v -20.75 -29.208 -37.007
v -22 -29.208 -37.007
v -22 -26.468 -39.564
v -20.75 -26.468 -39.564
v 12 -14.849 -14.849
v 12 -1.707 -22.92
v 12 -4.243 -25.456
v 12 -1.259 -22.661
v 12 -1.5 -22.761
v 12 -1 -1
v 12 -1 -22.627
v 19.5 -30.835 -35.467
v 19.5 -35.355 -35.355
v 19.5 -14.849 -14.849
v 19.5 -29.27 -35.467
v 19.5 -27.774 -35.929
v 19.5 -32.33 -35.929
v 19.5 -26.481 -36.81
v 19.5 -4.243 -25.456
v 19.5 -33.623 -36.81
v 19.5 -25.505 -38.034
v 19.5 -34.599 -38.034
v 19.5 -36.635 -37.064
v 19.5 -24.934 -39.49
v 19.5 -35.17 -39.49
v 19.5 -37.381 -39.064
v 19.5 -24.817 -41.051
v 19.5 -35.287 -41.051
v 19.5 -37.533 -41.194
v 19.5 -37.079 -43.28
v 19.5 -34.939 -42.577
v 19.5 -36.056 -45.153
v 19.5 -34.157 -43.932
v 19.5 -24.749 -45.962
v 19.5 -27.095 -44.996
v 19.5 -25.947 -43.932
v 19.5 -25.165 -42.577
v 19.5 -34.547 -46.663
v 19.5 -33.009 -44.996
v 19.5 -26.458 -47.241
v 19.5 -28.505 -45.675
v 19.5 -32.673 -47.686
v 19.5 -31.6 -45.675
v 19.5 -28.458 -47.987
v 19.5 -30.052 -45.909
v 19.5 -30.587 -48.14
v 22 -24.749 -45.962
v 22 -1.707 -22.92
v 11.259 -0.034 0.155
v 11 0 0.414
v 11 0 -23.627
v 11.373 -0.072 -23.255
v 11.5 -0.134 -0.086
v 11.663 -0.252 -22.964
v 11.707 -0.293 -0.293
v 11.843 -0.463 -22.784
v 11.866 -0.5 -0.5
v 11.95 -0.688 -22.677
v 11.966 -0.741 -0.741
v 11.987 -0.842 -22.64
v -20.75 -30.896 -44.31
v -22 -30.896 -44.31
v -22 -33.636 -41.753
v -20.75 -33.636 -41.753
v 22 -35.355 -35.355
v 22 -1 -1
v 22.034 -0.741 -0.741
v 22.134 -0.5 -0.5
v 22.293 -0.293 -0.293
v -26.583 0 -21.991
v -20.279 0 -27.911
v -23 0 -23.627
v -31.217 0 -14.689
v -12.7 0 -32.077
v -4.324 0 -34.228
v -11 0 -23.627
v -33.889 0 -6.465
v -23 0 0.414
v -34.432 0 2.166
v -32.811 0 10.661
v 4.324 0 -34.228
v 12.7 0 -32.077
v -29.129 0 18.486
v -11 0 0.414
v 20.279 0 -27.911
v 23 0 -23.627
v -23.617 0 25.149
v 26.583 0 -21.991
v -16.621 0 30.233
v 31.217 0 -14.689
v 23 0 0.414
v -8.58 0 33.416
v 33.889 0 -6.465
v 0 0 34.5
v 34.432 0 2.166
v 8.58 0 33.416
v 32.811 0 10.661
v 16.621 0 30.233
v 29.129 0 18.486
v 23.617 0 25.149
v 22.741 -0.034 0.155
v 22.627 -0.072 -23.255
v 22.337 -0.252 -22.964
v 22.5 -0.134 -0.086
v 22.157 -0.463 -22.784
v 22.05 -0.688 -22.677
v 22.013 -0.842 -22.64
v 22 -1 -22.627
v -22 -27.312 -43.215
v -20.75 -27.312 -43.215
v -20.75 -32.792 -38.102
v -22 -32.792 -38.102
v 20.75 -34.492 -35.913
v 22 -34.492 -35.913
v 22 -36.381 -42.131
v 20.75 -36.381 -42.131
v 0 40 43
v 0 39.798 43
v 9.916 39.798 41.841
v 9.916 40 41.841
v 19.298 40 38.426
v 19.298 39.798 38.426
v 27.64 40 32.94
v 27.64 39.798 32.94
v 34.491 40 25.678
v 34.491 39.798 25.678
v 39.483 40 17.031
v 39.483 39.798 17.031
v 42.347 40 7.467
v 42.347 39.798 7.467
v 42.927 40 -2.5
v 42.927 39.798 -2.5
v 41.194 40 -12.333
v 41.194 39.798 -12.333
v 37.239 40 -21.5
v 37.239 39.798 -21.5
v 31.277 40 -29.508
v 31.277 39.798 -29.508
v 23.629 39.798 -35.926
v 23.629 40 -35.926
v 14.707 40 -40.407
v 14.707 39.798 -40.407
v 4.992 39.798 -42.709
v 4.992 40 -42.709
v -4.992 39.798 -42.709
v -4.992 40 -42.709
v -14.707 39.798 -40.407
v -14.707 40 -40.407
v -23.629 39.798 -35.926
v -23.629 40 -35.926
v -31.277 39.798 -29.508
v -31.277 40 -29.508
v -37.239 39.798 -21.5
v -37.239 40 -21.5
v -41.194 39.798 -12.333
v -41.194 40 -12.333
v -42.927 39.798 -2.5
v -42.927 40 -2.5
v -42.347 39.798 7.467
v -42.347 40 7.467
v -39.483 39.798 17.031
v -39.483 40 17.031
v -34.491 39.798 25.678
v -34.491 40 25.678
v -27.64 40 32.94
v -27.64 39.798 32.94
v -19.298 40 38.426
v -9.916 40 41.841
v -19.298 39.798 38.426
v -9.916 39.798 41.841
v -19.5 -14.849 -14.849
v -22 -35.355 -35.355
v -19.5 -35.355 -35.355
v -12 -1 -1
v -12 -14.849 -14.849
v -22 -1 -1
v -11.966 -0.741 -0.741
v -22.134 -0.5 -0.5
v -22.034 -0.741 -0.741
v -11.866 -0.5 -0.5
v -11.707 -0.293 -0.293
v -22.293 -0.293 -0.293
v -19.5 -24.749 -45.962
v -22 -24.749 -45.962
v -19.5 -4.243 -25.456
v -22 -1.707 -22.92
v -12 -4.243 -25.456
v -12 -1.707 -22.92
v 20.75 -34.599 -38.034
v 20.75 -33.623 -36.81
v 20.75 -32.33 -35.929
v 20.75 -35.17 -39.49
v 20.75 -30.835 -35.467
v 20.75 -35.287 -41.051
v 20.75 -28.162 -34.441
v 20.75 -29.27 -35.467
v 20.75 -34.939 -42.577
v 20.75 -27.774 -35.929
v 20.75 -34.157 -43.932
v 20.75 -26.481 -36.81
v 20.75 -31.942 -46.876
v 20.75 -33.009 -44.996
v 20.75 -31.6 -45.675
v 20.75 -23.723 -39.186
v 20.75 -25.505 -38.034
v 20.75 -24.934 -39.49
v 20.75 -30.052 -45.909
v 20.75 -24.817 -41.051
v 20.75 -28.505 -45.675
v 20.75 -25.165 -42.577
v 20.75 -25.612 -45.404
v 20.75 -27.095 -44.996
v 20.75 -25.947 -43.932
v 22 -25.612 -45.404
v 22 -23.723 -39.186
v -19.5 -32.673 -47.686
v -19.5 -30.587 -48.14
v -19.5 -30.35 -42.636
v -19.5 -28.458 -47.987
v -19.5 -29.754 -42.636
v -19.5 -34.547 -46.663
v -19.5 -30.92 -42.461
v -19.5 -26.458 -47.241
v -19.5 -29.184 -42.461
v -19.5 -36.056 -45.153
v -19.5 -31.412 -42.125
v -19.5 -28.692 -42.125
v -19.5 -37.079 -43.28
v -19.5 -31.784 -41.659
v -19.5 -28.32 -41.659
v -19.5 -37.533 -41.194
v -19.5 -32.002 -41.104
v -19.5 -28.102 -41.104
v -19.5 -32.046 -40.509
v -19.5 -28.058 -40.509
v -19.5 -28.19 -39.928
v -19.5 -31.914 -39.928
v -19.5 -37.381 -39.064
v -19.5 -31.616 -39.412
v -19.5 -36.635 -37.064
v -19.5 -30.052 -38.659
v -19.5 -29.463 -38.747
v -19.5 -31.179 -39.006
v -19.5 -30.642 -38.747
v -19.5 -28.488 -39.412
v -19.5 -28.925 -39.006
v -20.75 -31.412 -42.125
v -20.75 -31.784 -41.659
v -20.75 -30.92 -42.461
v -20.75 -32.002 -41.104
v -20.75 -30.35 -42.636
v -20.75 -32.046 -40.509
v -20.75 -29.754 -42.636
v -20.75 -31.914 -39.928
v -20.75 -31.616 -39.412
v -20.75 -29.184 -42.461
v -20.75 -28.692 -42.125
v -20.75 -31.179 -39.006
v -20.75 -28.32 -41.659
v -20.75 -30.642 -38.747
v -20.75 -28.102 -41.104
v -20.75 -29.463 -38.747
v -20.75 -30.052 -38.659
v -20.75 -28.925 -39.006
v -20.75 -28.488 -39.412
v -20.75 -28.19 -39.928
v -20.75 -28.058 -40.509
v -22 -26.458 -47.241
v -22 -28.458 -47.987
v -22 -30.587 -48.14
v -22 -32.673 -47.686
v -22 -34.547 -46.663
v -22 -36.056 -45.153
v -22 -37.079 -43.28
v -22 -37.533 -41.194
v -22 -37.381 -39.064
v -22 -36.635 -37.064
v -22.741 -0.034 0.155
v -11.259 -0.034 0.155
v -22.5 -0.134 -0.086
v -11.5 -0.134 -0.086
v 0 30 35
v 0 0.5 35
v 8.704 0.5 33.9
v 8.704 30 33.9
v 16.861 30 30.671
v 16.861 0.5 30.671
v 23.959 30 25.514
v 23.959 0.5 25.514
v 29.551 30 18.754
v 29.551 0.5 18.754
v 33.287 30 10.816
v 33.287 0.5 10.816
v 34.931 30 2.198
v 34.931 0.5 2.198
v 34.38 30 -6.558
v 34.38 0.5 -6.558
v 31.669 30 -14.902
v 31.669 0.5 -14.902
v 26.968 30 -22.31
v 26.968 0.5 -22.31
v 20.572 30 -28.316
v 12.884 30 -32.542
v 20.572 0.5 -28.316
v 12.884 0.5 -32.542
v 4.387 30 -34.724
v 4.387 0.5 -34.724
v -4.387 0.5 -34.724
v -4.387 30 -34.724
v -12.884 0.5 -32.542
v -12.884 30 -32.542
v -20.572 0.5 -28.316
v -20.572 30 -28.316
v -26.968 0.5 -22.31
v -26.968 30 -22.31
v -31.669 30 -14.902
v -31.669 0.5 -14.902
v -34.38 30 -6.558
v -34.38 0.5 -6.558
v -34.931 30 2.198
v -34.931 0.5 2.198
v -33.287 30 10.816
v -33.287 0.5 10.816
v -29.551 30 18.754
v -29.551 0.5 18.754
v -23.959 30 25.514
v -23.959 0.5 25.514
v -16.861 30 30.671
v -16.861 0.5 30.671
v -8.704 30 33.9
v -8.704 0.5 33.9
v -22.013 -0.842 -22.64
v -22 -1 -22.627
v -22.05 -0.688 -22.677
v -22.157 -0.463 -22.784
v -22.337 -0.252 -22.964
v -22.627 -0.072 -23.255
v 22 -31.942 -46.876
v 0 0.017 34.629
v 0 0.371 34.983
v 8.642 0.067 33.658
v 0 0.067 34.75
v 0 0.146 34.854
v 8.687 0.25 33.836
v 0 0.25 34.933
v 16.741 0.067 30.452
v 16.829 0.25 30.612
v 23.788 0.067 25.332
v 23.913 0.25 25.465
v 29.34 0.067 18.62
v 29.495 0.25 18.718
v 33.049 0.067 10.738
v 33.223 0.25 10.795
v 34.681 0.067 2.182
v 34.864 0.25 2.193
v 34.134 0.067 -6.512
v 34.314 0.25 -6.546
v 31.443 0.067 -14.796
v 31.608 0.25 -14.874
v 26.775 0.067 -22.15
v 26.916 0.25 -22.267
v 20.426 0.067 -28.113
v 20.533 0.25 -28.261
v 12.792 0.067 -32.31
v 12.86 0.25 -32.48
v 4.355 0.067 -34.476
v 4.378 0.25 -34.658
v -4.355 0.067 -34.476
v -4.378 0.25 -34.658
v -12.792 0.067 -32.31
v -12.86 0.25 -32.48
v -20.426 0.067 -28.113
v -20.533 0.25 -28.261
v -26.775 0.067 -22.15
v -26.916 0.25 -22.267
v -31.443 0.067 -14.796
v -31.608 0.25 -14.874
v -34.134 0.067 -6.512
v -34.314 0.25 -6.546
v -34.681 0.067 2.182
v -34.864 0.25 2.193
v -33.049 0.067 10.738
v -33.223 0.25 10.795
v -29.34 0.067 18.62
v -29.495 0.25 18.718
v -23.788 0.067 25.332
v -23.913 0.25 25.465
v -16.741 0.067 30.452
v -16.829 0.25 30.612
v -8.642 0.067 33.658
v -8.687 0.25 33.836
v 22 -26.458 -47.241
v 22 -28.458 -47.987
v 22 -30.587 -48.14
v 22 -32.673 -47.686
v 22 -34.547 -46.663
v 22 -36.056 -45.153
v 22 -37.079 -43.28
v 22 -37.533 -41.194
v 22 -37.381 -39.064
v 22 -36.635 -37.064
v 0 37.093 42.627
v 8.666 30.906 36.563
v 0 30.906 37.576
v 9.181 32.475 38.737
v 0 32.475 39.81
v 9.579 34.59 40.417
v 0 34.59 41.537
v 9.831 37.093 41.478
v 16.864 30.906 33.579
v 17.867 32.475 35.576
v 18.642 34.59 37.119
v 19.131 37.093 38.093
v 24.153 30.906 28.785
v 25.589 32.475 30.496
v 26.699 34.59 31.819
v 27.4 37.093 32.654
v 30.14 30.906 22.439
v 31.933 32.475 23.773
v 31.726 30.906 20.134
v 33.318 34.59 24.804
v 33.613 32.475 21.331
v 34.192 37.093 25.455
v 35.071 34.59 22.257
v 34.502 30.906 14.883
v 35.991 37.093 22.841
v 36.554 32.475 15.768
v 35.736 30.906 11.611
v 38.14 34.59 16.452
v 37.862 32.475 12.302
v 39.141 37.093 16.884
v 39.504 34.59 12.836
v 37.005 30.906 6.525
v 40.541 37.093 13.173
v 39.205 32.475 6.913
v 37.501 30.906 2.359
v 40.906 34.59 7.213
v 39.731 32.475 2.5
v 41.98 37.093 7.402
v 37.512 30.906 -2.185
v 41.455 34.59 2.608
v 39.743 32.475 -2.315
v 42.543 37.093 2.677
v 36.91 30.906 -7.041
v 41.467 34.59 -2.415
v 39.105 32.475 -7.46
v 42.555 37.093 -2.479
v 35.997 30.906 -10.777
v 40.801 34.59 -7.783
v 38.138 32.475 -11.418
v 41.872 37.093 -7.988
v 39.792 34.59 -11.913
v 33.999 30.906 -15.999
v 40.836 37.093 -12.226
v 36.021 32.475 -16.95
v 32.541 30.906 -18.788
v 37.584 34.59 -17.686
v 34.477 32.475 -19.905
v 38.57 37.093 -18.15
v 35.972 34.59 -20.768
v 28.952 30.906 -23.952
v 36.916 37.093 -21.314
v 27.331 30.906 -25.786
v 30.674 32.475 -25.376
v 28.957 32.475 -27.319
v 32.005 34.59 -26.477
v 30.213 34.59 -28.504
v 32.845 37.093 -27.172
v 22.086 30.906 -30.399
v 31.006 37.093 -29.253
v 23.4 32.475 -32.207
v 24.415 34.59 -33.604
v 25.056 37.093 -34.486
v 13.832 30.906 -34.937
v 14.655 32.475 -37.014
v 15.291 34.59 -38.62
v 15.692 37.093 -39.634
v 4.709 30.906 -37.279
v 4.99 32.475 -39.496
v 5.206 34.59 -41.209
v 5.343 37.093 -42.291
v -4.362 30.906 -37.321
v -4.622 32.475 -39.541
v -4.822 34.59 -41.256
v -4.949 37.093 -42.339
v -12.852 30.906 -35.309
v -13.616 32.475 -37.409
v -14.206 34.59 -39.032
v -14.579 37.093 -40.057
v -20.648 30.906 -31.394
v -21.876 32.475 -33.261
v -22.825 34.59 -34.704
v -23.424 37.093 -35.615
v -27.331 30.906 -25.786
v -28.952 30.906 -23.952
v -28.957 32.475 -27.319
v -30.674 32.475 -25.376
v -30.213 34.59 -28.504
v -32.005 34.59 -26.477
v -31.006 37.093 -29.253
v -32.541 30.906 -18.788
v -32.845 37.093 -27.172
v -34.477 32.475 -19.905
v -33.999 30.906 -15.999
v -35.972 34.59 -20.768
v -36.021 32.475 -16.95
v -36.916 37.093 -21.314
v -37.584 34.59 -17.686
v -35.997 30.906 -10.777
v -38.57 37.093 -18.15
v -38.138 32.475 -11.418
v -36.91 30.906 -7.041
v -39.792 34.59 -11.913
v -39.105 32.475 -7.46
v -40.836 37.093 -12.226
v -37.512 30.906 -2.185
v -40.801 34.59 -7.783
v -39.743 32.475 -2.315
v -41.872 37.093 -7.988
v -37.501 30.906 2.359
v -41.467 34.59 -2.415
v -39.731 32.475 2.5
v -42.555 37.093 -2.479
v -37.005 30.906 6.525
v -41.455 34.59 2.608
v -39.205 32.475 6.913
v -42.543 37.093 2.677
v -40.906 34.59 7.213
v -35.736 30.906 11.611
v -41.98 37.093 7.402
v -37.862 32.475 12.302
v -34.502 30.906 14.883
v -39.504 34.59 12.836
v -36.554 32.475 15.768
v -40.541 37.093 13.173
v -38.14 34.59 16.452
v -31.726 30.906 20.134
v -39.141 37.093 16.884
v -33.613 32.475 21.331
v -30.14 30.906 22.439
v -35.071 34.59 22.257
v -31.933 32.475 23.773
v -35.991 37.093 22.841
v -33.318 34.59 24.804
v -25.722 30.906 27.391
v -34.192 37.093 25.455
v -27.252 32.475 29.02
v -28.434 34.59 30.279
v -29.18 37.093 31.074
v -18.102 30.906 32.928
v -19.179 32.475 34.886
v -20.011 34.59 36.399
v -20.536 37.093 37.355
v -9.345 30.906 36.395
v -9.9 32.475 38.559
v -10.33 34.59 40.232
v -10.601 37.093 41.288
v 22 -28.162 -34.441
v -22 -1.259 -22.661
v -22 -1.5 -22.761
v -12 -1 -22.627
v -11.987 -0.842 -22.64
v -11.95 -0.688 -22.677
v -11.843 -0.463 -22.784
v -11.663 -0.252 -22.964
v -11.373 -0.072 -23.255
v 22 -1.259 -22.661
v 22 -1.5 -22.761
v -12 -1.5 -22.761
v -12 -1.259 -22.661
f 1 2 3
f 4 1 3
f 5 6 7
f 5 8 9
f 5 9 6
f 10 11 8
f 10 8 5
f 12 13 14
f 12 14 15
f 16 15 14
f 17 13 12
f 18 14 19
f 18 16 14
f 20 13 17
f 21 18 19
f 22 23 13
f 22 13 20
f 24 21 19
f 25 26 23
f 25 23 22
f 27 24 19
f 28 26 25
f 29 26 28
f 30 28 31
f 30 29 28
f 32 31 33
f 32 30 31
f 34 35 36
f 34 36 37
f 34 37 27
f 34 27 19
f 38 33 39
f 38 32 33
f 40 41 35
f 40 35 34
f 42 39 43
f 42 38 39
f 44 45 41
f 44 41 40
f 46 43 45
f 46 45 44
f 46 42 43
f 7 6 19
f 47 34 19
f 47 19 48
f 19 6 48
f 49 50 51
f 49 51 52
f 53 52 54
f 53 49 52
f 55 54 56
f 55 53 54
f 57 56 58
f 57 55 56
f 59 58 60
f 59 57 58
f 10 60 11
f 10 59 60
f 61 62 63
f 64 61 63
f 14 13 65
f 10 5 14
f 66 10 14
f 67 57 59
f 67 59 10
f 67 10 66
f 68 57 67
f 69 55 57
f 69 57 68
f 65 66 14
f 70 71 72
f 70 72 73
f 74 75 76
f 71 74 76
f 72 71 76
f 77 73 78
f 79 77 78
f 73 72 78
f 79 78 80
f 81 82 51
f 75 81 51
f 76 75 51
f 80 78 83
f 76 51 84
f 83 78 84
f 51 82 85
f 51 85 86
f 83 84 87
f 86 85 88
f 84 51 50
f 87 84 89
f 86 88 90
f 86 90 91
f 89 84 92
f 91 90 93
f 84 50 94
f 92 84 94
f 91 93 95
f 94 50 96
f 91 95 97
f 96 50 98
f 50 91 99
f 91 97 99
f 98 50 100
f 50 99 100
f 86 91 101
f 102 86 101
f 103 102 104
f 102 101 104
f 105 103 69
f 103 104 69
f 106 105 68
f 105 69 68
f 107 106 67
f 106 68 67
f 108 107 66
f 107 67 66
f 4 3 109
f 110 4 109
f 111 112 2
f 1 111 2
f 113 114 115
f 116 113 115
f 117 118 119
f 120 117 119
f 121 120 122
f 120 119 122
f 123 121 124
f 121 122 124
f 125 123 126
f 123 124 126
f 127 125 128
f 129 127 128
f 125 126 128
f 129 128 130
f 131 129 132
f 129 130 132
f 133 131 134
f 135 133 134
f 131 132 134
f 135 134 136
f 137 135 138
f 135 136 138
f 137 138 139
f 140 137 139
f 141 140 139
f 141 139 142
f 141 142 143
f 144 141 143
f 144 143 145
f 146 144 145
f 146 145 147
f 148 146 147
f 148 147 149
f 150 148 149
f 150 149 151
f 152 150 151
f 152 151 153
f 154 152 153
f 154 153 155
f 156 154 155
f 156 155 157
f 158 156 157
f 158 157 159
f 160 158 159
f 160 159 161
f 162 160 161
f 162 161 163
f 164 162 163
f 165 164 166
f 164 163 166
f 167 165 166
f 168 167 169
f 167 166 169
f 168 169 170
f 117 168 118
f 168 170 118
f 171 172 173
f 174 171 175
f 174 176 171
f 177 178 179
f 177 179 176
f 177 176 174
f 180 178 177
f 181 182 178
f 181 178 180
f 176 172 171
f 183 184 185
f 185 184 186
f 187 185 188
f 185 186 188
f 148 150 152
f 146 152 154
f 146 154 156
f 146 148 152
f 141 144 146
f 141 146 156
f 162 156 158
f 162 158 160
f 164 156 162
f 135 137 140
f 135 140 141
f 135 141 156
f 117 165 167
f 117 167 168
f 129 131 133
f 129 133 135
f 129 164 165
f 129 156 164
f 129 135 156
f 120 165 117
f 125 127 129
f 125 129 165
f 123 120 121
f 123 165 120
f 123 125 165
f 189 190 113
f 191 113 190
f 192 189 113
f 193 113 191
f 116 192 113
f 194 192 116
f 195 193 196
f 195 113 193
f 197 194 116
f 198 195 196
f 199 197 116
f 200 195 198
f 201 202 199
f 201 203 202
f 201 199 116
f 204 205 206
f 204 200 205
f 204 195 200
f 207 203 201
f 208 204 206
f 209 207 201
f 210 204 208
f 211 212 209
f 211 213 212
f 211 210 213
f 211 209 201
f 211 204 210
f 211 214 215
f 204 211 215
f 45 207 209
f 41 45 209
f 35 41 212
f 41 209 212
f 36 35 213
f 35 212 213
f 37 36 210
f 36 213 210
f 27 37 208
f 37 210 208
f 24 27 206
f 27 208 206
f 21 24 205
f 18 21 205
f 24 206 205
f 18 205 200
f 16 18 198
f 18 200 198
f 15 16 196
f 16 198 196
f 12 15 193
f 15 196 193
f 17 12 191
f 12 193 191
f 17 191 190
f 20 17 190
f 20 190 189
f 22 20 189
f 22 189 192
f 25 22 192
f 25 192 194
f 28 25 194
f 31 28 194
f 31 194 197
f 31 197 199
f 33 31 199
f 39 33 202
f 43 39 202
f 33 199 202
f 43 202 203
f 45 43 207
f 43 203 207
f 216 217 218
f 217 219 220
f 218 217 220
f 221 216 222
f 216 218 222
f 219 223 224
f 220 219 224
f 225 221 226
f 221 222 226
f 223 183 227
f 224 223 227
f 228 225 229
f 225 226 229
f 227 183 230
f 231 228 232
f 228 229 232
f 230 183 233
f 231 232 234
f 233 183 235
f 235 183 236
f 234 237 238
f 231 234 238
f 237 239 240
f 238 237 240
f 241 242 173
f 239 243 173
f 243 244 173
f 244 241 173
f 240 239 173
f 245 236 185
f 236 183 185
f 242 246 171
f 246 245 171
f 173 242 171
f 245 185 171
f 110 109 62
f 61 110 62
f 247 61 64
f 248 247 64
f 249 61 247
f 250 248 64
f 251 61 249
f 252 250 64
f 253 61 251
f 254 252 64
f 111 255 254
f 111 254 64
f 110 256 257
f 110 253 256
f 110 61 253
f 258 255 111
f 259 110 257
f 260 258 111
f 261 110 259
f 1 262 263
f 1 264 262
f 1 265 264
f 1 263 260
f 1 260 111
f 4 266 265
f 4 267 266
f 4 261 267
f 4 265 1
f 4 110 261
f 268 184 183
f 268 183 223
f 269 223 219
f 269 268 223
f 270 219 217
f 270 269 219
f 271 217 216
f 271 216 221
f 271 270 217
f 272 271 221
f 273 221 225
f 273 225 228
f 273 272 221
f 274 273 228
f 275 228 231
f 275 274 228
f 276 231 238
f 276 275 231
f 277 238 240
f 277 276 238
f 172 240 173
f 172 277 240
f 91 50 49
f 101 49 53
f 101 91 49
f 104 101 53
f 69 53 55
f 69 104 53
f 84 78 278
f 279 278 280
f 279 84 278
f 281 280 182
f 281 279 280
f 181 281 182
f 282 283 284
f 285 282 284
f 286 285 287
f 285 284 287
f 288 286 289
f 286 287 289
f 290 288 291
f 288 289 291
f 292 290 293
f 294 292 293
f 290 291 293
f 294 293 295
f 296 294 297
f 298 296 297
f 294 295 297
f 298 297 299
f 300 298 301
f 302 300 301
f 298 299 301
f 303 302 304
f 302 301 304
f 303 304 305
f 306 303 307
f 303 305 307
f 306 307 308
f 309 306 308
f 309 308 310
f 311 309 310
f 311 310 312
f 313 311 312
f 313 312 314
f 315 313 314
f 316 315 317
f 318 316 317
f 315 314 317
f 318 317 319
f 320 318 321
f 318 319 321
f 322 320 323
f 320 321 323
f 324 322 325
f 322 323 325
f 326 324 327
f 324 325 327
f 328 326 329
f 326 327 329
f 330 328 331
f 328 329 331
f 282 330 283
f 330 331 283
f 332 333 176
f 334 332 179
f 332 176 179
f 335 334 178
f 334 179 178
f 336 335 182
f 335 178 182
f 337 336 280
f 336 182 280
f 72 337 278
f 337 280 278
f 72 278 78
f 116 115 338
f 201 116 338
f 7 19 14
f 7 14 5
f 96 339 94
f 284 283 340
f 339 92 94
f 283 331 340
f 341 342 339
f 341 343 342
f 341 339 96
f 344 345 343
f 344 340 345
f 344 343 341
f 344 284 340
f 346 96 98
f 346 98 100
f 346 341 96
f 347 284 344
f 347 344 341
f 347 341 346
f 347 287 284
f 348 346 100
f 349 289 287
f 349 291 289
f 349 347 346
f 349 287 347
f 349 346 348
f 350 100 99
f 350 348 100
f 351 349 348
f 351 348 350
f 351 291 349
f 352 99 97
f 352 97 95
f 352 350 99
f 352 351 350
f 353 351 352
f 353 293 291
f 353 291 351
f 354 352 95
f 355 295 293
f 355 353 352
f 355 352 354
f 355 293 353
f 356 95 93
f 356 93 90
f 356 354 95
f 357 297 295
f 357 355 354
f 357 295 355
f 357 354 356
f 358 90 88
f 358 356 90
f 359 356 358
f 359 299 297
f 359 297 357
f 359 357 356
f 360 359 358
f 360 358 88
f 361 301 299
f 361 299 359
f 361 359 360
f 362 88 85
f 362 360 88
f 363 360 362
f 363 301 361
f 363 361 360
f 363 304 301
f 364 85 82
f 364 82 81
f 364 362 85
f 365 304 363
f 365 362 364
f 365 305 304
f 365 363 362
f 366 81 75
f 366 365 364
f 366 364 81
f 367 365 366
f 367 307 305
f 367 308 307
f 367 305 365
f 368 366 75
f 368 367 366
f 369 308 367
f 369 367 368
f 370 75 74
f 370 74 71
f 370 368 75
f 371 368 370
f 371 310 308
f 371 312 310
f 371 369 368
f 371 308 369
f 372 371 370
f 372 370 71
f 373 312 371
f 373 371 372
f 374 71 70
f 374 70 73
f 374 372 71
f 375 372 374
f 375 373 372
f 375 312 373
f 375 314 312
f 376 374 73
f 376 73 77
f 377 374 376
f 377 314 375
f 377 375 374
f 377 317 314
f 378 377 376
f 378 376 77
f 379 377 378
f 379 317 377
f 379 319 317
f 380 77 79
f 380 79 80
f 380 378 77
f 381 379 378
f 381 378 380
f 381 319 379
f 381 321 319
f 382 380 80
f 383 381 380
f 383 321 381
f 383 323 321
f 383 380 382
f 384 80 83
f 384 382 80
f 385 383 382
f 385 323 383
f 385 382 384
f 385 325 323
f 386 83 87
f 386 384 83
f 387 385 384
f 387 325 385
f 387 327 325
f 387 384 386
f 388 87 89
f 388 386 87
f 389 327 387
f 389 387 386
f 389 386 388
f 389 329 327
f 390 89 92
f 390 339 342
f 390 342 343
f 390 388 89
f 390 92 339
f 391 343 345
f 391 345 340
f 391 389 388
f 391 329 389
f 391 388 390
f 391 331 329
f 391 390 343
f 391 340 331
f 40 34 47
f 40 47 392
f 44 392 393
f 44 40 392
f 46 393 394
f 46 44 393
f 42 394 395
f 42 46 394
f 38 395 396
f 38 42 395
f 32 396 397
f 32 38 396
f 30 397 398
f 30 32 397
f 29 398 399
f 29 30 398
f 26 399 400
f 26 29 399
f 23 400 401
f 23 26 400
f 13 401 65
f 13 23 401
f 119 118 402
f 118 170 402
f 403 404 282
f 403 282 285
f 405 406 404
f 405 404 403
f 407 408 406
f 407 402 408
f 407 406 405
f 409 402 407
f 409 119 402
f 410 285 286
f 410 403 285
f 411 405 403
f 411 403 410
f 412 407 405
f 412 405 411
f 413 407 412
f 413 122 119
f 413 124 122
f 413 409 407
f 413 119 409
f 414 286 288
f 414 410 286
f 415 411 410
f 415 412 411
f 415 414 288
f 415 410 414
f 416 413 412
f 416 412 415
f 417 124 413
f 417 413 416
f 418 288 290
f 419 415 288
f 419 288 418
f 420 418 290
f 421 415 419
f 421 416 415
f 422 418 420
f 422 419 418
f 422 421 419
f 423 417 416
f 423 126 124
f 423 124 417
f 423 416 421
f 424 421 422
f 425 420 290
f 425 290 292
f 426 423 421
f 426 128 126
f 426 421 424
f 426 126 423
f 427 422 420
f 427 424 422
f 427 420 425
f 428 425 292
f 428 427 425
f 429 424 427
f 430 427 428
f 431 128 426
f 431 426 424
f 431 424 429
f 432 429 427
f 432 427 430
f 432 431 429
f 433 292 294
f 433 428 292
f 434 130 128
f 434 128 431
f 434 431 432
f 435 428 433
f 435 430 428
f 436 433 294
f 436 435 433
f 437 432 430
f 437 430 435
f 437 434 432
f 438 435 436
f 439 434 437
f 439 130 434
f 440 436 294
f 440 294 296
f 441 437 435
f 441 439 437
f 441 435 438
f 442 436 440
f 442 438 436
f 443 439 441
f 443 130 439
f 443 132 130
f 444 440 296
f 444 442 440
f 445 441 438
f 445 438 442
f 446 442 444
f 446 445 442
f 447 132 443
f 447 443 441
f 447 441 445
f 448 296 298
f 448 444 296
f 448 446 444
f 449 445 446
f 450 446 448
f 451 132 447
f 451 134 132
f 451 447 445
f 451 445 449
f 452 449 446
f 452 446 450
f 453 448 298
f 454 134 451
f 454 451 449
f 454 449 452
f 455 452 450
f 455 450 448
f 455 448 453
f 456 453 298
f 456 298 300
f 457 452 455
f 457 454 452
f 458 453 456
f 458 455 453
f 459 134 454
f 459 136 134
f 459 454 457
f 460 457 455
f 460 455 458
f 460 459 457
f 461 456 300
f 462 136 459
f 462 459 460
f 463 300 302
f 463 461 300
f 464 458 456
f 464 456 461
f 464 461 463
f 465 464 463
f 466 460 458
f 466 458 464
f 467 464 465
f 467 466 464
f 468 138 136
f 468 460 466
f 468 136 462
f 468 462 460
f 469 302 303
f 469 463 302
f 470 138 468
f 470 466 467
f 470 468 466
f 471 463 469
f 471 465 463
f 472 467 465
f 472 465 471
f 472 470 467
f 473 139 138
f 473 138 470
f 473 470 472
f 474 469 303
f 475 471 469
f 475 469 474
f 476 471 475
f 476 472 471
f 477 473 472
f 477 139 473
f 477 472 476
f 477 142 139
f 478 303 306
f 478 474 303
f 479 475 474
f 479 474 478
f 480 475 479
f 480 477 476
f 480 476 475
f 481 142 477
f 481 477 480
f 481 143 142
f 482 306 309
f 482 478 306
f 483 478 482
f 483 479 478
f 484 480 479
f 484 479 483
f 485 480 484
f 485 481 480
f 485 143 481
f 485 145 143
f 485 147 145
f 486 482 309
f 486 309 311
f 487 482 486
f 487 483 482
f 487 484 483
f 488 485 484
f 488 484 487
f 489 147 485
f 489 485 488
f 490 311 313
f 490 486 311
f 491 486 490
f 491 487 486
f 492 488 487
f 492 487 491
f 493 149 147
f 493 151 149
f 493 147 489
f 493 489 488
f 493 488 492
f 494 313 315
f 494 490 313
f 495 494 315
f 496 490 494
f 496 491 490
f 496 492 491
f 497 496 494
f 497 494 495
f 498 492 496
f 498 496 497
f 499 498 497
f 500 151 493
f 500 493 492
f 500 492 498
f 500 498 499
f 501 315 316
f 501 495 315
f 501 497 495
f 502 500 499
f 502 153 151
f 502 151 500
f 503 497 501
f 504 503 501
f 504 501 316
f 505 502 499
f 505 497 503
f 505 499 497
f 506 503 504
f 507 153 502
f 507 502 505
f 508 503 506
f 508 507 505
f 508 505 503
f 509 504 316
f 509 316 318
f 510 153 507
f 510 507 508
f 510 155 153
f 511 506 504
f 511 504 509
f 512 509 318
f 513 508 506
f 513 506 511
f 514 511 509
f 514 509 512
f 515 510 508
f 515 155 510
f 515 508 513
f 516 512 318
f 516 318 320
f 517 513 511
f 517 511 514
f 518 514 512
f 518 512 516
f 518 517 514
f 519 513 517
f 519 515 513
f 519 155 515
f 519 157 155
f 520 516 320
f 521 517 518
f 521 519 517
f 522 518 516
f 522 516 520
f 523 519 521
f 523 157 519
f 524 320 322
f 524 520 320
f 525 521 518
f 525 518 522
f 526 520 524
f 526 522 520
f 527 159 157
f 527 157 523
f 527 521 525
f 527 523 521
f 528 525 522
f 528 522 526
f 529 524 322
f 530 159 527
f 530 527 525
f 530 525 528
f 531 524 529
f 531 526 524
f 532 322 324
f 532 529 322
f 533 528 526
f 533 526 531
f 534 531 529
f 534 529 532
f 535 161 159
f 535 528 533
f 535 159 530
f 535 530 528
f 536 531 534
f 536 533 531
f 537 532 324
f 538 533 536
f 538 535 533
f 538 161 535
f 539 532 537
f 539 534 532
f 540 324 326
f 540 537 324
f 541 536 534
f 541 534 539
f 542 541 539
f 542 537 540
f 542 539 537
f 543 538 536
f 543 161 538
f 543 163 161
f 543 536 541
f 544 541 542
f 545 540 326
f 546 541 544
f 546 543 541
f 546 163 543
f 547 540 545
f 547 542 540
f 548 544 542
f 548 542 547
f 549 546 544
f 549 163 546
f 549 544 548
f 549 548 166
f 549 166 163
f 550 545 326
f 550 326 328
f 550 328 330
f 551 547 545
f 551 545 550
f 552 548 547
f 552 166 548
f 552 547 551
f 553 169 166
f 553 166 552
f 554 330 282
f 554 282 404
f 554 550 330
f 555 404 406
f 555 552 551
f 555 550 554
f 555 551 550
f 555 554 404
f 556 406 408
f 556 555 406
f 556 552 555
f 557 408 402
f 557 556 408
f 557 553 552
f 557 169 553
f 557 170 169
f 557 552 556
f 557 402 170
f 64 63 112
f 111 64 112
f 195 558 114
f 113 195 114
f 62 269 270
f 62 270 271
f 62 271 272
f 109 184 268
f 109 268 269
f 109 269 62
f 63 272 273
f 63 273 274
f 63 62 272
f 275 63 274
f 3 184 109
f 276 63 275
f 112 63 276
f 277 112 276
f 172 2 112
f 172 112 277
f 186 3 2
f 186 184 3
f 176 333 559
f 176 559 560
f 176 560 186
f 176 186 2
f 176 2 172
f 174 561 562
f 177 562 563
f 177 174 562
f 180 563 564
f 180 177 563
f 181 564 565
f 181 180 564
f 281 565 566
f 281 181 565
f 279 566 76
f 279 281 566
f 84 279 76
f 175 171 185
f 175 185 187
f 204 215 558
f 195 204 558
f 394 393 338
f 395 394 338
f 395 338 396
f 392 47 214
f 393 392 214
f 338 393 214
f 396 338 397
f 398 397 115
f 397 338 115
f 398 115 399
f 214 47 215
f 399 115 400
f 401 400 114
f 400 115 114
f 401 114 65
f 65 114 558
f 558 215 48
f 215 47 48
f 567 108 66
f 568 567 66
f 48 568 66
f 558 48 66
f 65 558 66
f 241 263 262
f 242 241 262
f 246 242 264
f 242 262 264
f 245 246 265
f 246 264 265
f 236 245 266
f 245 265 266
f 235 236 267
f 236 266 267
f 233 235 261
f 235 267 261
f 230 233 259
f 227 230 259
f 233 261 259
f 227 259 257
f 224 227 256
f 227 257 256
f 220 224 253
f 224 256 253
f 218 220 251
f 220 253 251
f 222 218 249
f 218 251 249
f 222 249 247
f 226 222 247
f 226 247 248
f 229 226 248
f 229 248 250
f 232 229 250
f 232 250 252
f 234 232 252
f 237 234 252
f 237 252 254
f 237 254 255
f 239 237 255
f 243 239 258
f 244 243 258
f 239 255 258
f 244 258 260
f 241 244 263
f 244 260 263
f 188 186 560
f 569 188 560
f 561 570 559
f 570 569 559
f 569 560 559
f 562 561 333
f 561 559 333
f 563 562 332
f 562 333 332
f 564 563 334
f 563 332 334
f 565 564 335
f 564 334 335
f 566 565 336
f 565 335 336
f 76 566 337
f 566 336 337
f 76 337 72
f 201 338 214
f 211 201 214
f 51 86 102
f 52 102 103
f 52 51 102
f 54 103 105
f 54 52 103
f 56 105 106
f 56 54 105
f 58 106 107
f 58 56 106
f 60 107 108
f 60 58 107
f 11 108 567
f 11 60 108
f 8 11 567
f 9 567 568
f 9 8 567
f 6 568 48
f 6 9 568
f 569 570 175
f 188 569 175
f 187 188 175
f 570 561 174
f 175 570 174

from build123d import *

# Parameters (mm, degrees)
SKETCH2_R                           = 35
BOSS_EXTRUDE2_DEPTH                 = 30
SKETCH4_R                           = 43
BOSS_EXTRUDE3_DEPTH                 = 10
FILLET2_R                           = 10
SKETCH6_W                           = 10
SKETCH6_H                           = 30
EXTRUDE_THIN2_DEPTH                 = 15
SKETCH10_W                          = 10
SKETCH10_H                          = 15
BOSS_EXTRUDE4_DEPTH                 = 30
SKETCH11_W                          = 10
SKETCH11_H                          = 15
BOSS_EXTRUDE5_DEPTH                 = 30
FILLET4_R                           = 1
FILLET5_R                           = 0.5
CUT_EXTRUDE1_DEPTH                  = 127.256815818
CUT_EXTRUDE1_DEPTH_BACK             = 39
SKETCH12_W                          = 7.5
SKETCH12_H                          = 15
CUT_EXTRUDE2_REACH                  = 96.008
SKETCH17_W                          = 7.5
SKETCH17_H                          = 15
CUT_EXTRUDE3_DEPTH                  = 29
CUT_EXTRUDE3_DIRECTION_2_REACH      = 118.906
CUT_EXTRUDE3_DIRECTION_2_END_RADIUS = 7.5
CUT_EXTRUDE4_DEPTH                  = 1.25
SKETCH20_R                          = 2
CUT_EXTRUDE5_DEPTH                  = 1.25
CUT_EXTRUDE7_DEPTH                  = 1.25
SKETCH22_R                          = 5.25
CUT_EXTRUDE8_DEPTH                  = 1.25


with BuildPart() as part:
    # Sketch2 → Boss-Extrude2 (new body)
    with BuildSketch(Plane(origin=(0, 0, 0), x_dir=(1, 0, 0), z_dir=(0, 1, 0))):
        with Locations(Location((0, 0, 0), (0, 0, 270))):
            Circle(SKETCH2_R)
    extrude(amount=BOSS_EXTRUDE2_DEPTH)

    # Sketch4 → Boss-Extrude3 (add)
    with BuildSketch(Plane(origin=(0, 30, 0), x_dir=(1, 0, 0), z_dir=(0, 1, 0))):
        with Locations(Location((0, 0, 0), (0, 0, 270))):
            Circle(SKETCH4_R)
    extrude(amount=BOSS_EXTRUDE3_DEPTH)

    # Fillet2
    # the kernel refuses this fillet: 10 mm, written as the material it takes off along each edge
    with BuildSketch(Plane(origin=(0, 30, 0), x_dir=(0, 0, 1), z_dir=(-1, 0, 0))) as fillet2_piece_1:
        with BuildLine():
            CenterArc((33, 9.797958971), FILLET2_R, 281.536959033, 78.463040967)
            Line((35, 0), (35.04, -0.195959179))
            ThreePointArc((35.04, -0.195959179), (39, -0.2), (43, -0.2))
            Line((43, -0.2), (43.2, 0))
            Line((43.2, 0), (43.2, 9.797958971))
            Line((43.2, 9.797958971), (43, 9.797958971))
        make_face()
    revolve(axis=Axis((0, 30, 0), (0, 1, 0)), mode=Mode.SUBTRACT)

    # Sketch6 → Extrude-Thin2 (add)
    with BuildSketch(Plane(origin=(0, 0, 0), x_dir=(1, 0, 0), z_dir=(0, 0.7071067811865464, -0.7071067811865488))):
        with Locations((17, 15)):
            Rectangle(SKETCH6_W, SKETCH6_H)
        with Locations((-17, 15)):
            Rectangle(SKETCH6_W, SKETCH6_H)
    extrude(amount=EXTRUDE_THIN2_DEPTH)

    # Sketch10 → Boss-Extrude4 (add)
    with BuildSketch(Plane(origin=(0, -21.213203436, -21.213203436), x_dir=(1, 0, 0), z_dir=(0, -0.7071067811865487, -0.7071067811865465))):
        with Locations((17, -7.5)):
            Rectangle(SKETCH10_W, SKETCH10_H)
    extrude(amount=BOSS_EXTRUDE4_DEPTH)

    # Sketch11 → Boss-Extrude5 (add)
    with BuildSketch(Plane(origin=(0, -21.213203436, -21.213203436), x_dir=(1, 0, 0), z_dir=(0, -0.7071067811865487, -0.7071067811865465))):
        with Locations((-17, -7.5)):
            Rectangle(SKETCH11_W, SKETCH11_H)
    extrude(amount=BOSS_EXTRUDE5_DEPTH)

    # Fillet4
    fillet4_edges = [part.edges().sort_by_distance(p)[0] for p in [
        (-12, 0, -10.606601718),
        (-17, 0, -21.213203436),
        (-22, 0, -10.606601718),
        (-17, 0, 0),
        (12, 0, -10.606601718),
        (22, 0, -10.606601718),
        (17, 0, -21.213203436),
        (17, 0, 0),
    ]]
    fillet(fillet4_edges, radius=FILLET4_R)

    # Fillet5
    fillet5_edges = [part.edges().sort_by_distance(p)[0] for p in [
        (0, 0, -35),
    ]]
    fillet(fillet5_edges, radius=FILLET5_R)

    # Sketch12 → Cut-Extrude1 (cut, two sides: drawn at the far end of the back side and taken through both)
    with BuildSketch(Plane(origin=(0, -42.426406871, -42.426406871), x_dir=(1, 0, 0), z_dir=(0, -0.7071067811865485, -0.7071067811865467)).offset(-CUT_EXTRUDE1_DEPTH_BACK)):
        with Locations((-15.75, -7.5)):
            Rectangle(SKETCH12_W, SKETCH12_H)
    extrude(amount=CUT_EXTRUDE1_DEPTH + CUT_EXTRUDE1_DEPTH_BACK, mode=Mode.SUBTRACT)

    # Sketch13 → Cut-Extrude2 (cut, up to next)
    with BuildSketch(Plane.ZY.offset(22), mode=Mode.PRIVATE) as cut_extrude2_sk1:
        with BuildLine():
            Line((-42.426406871, -42.426406871), (-53.033008589, -31.819805153))
            Line((-53.033008589, -31.819805153), (-45.961940777, -24.748737342))
            ThreePointArc((-45.961940777, -24.748737342), (-45.961940777, -35.355339059), (-35.355339059, -35.355339059))
            Line((-35.355339059, -35.355339059), (-42.426406871, -42.426406871))
        make_face()
    cut_extrude2_tool1 = extrude(cut_extrude2_sk1.sketch, amount=-CUT_EXTRUDE2_REACH, mode=Mode.PRIVATE) & part.part
    add(cut_extrude2_tool1.solids().sort_by_distance((-22, -35.429094, -46.035696))[0], mode=Mode.SUBTRACT)
    add(cut_extrude2_tool1.solids().sort_by_distance((-22, -35.429094, -46.035696))[1], mode=Mode.SUBTRACT)

    # Sketch17 → Cut-Extrude3 (cut)
    with BuildSketch(Plane(origin=(0, -35.355339059, -35.355339059), x_dir=(-1, 0, 0), z_dir=(0, -0.7071067811865487, -0.7071067811865465))):
        with Locations((-15.75, 7.5)):
            Rectangle(SKETCH17_W, SKETCH17_H)
    extrude(amount=-CUT_EXTRUDE3_DEPTH, mode=Mode.SUBTRACT)

    # Cut-Extrude3 direction 2: up to this cylinder (the profile starts inside it)
    cut_extrude3_direction_2_end = Plane(origin=(15.75, -30.0520382, -40.658639918), z_dir=(-1, 0, 0)) * Cylinder(CUT_EXTRUDE3_DIRECTION_2_END_RADIUS, 253.812, mode=Mode.PRIVATE)
    # Sketch17 → Cut-Extrude3 direction 2 (cut, up to the surface)
    with BuildSketch(Plane(origin=(0, -35.355339059, -35.355339059), x_dir=(-1, 0, 0), z_dir=(0, -0.7071067811865487, -0.7071067811865465)), mode=Mode.PRIVATE) as cut_extrude3_direction_2_sk1:
        with Locations((-15.75, 7.5)):
            Rectangle(SKETCH17_W, SKETCH17_H)
    cut_extrude3_direction_2_tool1 = extrude(cut_extrude3_direction_2_sk1.sketch, amount=CUT_EXTRUDE3_DIRECTION_2_REACH, mode=Mode.PRIVATE) & cut_extrude3_direction_2_end
    add(cut_extrude3_direction_2_tool1.solids().sort_by_distance((15.75, -30.052038, -40.65864))[0], mode=Mode.SUBTRACT)

    # Sketch18 → Cut-Extrude4 (cut)
    with BuildSketch(Plane.ZY.offset(22)):
        Polygon((-44.309999675, -30.896234088), (-41.753224712, -33.636306452), (-38.101864956, -32.792110564), (-37.007280162, -29.207842313), (-39.564055124, -26.467769949), (-43.215414881, -27.311965837), align=None)
    extrude(amount=-CUT_EXTRUDE4_DEPTH, mode=Mode.SUBTRACT)

    # Sketch20 → Cut-Extrude5 (cut)
    with BuildSketch(Plane.ZY.offset(20.75)):
        with Locations((-40.658639918, -30.0520382)):
            Circle(SKETCH20_R)
    extrude(amount=-CUT_EXTRUDE5_DEPTH, mode=Mode.SUBTRACT)

    # Sketch21 → Cut-Extrude7 (cut)
    with BuildSketch(Plane(origin=(22, 0, 0), x_dir=(0, 0, -1), z_dir=(1, 0, 0))):
        Polygon((34.441125497, -28.162247172), (35.913275669, -34.491668124), (42.130790091, -36.381459152), (46.876154339, -31.941829228), (45.404004167, -25.612408277), (39.186489746, -23.722617249), align=None)
    extrude(amount=-CUT_EXTRUDE7_DEPTH, mode=Mode.SUBTRACT)

    # Sketch22 → Cut-Extrude8 (cut)
    with BuildSketch(Plane(origin=(20.75, 0, 0), x_dir=(0, 0, -1), z_dir=(1, 0, 0))):
        with Locations((40.658639918, -30.0520382)):
            Circle(SKETCH22_R)
    extrude(amount=-CUT_EXTRUDE8_DEPTH, mode=Mode.SUBTRACT)


solid = part.part
